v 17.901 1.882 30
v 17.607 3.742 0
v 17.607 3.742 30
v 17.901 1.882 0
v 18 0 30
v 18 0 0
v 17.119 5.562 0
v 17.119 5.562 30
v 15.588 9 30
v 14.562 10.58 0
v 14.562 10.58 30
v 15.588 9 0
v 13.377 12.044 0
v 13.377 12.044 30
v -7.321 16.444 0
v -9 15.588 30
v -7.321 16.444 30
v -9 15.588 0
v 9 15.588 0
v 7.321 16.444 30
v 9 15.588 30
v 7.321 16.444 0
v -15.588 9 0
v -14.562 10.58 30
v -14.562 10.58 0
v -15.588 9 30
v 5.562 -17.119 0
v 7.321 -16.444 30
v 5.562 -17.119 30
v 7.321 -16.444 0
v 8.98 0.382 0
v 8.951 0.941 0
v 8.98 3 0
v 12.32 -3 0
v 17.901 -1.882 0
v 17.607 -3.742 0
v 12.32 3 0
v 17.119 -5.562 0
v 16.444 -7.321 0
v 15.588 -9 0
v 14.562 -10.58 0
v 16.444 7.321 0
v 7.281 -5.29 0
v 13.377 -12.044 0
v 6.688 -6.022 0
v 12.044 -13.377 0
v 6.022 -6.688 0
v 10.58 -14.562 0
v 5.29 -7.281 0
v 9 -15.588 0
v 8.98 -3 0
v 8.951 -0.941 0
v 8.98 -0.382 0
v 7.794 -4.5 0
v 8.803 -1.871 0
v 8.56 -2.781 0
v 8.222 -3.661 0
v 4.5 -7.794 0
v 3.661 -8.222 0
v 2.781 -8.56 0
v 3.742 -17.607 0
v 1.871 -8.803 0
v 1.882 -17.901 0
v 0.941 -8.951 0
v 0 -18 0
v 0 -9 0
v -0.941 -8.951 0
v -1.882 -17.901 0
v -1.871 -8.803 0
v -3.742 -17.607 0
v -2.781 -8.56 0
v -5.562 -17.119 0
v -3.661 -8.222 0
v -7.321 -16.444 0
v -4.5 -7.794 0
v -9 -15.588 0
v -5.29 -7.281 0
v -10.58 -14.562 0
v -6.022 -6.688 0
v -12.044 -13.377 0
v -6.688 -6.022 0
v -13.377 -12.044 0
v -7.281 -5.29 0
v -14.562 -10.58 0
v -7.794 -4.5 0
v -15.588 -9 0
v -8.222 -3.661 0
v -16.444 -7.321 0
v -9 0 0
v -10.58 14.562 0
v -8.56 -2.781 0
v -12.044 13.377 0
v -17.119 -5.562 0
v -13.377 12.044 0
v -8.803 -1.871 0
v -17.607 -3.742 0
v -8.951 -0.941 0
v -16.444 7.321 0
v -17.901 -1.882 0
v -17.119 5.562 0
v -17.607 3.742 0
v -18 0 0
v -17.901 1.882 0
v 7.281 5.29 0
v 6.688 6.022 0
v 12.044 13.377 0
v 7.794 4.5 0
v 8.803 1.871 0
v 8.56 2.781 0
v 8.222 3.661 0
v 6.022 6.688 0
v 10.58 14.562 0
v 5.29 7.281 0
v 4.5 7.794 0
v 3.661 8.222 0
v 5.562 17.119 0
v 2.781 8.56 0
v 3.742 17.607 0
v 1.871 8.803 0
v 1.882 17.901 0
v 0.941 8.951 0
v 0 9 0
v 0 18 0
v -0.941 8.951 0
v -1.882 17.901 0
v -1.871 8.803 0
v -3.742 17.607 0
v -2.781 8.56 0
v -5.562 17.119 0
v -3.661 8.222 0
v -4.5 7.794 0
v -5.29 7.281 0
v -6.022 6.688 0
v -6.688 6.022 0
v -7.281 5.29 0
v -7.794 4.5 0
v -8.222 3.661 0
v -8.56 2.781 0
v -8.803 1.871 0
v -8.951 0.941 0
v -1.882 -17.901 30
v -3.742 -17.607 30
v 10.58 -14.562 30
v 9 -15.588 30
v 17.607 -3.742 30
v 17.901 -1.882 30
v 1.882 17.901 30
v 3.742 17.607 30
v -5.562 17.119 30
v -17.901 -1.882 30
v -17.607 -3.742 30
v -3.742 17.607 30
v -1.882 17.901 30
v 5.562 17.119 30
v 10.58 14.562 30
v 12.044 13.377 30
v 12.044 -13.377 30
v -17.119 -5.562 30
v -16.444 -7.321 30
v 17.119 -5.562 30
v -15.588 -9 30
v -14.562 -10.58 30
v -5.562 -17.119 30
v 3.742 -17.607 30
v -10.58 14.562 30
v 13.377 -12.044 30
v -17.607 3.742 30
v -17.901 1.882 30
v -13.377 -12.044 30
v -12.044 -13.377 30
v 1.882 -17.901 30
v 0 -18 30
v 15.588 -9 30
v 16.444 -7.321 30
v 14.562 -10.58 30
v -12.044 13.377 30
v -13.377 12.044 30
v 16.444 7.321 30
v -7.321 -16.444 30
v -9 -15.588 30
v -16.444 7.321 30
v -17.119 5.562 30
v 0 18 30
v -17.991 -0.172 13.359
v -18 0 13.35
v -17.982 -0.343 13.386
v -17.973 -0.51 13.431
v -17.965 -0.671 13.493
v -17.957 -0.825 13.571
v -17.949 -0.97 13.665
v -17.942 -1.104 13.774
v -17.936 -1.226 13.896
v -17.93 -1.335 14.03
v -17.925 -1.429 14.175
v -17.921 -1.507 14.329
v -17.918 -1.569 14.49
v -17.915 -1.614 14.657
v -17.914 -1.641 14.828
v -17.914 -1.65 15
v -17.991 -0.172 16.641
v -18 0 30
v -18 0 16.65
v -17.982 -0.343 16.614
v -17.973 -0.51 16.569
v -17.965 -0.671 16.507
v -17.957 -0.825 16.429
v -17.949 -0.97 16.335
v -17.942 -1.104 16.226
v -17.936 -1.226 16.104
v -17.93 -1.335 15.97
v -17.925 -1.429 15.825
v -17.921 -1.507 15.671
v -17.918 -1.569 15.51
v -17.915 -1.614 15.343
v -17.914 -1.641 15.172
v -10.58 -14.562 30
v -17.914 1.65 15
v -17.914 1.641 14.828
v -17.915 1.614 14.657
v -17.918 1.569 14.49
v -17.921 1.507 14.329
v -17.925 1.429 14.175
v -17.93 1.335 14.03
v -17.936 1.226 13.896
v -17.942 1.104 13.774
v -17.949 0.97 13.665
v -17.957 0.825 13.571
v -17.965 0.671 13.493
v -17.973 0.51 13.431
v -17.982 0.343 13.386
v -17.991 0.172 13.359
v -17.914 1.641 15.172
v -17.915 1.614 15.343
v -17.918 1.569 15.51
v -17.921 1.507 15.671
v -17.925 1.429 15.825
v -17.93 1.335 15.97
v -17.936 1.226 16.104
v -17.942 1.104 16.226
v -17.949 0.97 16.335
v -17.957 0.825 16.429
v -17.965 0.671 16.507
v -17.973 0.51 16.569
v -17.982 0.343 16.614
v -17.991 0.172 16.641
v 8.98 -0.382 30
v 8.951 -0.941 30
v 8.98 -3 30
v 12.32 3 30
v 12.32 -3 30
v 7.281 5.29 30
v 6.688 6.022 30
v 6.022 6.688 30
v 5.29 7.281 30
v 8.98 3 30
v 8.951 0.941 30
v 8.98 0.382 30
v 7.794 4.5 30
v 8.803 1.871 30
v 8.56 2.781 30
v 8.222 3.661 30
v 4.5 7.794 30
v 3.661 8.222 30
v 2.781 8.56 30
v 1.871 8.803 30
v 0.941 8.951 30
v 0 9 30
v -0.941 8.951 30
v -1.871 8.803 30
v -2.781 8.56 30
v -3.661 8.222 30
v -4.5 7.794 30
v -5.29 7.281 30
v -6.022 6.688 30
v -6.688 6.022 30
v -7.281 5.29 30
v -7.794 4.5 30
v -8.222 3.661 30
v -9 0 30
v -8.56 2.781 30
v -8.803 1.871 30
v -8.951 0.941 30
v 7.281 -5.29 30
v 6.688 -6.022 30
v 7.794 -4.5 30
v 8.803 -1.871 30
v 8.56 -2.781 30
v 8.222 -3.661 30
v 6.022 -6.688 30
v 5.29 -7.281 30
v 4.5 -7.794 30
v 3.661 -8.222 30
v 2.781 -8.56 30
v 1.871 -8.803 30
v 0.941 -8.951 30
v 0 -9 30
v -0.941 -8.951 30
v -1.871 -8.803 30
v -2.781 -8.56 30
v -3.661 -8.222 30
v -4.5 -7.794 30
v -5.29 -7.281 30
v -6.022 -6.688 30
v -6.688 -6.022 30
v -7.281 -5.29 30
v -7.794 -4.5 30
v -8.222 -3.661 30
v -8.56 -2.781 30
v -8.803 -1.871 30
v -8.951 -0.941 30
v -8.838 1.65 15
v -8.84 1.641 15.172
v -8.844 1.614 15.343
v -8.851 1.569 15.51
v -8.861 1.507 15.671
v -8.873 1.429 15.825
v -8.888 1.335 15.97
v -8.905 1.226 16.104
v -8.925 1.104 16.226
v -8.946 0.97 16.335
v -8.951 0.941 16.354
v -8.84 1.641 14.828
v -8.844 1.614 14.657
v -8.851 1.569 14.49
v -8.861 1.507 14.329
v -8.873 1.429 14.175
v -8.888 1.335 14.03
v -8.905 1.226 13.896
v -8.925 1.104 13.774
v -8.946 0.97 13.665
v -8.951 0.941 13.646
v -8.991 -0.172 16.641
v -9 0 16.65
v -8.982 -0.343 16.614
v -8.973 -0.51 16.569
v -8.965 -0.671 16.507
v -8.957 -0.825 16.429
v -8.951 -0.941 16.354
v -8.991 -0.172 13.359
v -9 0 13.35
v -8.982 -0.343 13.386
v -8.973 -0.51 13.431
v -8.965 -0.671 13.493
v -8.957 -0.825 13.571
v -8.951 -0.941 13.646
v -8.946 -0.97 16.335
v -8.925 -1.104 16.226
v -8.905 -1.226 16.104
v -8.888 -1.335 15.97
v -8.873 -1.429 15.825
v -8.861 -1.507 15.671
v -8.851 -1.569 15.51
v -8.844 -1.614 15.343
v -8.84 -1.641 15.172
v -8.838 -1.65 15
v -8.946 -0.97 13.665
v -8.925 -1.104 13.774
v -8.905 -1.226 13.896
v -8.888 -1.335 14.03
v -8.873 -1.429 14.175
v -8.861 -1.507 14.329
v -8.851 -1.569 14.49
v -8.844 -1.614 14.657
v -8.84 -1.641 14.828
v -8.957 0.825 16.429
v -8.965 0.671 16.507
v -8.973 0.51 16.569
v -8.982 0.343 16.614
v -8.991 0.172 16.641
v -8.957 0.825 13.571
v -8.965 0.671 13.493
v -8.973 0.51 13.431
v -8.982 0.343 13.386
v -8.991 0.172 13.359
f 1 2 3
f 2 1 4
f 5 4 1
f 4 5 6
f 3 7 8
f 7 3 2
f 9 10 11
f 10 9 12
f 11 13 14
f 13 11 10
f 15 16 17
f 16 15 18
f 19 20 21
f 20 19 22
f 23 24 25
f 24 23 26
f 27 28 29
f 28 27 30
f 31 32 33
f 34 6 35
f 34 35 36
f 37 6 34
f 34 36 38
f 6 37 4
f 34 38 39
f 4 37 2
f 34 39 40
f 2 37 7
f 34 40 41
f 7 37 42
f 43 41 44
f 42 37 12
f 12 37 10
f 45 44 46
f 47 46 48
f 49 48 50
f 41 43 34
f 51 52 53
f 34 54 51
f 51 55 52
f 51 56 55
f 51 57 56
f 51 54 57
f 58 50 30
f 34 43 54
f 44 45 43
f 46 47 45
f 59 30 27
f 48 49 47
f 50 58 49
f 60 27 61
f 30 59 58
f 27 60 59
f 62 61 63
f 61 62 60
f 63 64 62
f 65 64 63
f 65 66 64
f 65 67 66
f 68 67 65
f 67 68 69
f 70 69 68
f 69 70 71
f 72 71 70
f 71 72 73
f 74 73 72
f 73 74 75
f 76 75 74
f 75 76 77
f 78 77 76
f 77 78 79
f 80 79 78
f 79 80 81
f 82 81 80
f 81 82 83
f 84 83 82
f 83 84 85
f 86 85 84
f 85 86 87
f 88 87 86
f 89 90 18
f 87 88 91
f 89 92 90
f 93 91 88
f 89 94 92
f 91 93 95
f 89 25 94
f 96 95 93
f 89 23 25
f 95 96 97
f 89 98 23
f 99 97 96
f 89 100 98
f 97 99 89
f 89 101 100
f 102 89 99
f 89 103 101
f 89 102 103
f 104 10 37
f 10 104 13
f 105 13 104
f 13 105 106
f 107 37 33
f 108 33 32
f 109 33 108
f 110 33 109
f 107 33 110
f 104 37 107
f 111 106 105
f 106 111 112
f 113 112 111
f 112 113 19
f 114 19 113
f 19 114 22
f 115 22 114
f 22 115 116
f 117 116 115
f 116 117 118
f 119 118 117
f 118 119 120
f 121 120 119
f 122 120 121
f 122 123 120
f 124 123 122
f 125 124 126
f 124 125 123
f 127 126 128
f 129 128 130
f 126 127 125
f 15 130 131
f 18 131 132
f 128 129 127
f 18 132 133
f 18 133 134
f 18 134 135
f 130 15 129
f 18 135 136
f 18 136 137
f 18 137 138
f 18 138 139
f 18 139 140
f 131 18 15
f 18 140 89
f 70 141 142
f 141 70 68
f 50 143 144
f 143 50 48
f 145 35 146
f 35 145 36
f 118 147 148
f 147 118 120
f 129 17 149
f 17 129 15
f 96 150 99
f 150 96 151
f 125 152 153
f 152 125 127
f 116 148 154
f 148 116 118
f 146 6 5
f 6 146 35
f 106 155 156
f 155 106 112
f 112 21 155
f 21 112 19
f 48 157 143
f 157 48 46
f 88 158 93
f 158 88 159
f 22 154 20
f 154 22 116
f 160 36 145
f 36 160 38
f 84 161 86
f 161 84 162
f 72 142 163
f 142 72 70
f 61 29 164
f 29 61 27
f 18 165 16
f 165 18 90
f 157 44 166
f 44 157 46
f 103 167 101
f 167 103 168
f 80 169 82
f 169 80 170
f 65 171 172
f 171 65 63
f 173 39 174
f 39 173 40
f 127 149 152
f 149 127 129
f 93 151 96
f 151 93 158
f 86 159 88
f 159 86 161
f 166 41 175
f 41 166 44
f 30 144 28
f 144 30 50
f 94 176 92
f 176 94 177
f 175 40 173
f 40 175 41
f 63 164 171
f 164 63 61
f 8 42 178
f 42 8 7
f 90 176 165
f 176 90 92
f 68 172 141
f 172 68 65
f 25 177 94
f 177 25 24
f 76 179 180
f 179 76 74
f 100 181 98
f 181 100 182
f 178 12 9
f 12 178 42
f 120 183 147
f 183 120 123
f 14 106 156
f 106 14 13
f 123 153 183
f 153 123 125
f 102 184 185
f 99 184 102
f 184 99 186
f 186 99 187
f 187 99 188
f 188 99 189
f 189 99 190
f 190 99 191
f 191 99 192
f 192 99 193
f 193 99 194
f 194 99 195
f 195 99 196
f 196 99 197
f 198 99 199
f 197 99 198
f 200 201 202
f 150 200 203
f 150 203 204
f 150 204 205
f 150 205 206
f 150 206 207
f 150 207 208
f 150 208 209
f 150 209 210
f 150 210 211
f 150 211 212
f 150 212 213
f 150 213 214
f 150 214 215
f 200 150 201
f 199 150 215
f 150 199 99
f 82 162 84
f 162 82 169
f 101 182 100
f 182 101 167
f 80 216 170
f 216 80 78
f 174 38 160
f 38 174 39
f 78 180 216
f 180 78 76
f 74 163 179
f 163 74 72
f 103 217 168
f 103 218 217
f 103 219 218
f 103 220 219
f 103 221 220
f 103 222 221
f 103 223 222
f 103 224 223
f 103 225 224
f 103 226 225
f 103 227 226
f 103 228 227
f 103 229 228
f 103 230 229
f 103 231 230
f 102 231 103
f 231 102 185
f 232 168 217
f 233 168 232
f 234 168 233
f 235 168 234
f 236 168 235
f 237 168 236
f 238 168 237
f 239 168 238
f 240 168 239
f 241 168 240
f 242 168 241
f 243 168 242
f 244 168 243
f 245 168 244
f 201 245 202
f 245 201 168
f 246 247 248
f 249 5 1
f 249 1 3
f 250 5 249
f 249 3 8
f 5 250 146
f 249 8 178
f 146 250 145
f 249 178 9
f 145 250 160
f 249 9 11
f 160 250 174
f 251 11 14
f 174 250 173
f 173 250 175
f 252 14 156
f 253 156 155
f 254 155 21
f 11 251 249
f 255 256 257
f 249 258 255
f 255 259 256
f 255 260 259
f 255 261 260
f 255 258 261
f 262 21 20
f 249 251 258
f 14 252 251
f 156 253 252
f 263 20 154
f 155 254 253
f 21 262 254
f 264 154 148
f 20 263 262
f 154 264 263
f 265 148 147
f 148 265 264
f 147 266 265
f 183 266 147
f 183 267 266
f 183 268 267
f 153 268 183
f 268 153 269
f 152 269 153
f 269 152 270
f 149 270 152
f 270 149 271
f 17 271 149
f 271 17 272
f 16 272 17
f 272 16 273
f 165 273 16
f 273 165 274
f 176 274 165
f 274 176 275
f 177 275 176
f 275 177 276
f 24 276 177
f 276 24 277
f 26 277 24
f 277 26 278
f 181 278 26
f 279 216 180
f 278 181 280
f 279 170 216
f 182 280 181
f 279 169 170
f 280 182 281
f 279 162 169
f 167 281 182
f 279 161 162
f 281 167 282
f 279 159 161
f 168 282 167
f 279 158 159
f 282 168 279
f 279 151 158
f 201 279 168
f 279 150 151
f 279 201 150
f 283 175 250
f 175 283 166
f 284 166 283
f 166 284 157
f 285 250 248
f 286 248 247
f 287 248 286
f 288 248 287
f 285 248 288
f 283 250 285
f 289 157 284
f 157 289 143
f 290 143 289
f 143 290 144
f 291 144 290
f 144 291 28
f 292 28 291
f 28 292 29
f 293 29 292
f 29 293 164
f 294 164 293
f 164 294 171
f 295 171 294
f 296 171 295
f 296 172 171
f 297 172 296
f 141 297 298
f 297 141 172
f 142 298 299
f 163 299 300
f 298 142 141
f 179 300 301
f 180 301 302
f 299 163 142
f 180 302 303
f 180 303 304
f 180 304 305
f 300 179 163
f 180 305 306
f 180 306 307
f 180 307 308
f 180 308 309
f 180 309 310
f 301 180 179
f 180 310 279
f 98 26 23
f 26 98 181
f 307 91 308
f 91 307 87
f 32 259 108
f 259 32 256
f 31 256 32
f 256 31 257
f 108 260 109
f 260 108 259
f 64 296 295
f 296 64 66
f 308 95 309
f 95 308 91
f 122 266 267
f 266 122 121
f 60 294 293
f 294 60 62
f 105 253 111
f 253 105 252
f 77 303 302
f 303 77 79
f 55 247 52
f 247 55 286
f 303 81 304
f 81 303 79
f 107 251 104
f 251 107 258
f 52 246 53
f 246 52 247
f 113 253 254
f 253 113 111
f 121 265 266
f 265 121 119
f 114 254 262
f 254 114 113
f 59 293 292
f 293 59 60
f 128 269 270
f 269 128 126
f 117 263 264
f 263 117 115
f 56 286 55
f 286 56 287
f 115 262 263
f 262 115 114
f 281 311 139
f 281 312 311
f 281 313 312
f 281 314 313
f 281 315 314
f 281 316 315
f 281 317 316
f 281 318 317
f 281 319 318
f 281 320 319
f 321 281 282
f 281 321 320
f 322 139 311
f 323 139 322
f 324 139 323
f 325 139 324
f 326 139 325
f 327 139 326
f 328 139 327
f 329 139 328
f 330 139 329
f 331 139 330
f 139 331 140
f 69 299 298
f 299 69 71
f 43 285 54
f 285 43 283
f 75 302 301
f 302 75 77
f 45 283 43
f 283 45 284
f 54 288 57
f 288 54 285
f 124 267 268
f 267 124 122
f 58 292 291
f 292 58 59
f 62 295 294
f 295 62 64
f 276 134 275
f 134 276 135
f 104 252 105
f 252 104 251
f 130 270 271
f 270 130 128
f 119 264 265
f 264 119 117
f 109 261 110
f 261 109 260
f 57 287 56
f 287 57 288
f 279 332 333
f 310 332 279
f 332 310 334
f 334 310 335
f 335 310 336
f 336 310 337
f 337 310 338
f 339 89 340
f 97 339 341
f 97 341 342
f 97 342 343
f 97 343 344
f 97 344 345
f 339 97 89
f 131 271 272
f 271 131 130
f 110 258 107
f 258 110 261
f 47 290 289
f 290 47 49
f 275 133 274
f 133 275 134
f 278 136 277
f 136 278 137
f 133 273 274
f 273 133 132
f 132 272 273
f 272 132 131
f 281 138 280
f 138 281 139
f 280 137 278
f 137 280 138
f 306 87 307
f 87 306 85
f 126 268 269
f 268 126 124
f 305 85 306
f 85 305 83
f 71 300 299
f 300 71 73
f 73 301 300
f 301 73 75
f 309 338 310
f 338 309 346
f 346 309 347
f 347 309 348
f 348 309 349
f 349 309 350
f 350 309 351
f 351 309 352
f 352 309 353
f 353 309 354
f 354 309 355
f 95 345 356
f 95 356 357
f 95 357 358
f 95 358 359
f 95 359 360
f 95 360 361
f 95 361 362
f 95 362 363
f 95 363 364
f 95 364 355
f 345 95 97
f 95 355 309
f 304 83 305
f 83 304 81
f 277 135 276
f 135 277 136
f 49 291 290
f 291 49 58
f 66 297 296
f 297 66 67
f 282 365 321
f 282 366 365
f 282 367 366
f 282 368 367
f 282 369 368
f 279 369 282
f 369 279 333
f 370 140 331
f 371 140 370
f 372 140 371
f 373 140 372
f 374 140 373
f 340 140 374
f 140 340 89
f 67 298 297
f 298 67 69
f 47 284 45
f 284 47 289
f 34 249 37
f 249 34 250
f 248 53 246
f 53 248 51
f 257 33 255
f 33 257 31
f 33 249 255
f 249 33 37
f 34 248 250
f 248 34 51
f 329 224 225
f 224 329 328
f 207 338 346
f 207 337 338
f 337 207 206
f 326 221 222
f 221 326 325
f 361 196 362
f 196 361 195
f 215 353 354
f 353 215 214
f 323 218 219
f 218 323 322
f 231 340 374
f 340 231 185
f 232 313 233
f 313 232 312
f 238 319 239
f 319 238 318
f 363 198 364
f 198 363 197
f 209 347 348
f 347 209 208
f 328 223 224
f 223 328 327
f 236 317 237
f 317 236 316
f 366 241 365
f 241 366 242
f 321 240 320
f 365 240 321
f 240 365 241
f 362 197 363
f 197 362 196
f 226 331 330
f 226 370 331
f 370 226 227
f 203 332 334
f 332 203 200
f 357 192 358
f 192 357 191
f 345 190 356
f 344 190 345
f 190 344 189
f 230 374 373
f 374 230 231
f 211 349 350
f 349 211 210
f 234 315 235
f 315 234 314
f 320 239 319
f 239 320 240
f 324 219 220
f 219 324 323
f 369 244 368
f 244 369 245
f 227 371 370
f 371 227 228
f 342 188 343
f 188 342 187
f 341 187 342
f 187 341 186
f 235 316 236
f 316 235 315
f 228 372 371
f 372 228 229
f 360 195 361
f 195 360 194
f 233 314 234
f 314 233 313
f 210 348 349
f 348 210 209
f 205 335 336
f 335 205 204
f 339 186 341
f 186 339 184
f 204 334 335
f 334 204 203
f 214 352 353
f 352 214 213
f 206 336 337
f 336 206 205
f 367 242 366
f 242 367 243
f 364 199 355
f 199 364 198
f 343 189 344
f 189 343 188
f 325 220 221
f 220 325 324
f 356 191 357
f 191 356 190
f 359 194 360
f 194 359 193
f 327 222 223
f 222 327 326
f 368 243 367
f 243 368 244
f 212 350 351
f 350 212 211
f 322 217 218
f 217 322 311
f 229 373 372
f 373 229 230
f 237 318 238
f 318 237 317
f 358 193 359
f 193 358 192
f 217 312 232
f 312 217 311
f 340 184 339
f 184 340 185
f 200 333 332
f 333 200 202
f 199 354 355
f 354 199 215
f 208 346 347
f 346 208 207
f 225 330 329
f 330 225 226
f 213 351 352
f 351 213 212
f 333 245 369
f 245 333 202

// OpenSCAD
// Keyway hub for a 18 mm shaft.
$fn = 60;
eps = 0.02;
shaft_d = 18;
outer_d = 36;
length = 30;
key_w = 6;
key_depth = 3.3000000000000003;
difference() {
    cylinder(d = outer_d, h = length);
    translate([0, 0, -eps]) cylinder(d = shaft_d, h = length + 2 * eps);
    translate([shaft_d / 2 - eps, -key_w / 2, -eps]) cube([key_depth + 2 * eps, key_w, length + 2 * eps]);
    translate([-outer_d / 2 - eps, 0, length / 2]) rotate([0, 90, 0]) cylinder(d = 3.3, h = outer_d / 2 + 2 * eps);
}
